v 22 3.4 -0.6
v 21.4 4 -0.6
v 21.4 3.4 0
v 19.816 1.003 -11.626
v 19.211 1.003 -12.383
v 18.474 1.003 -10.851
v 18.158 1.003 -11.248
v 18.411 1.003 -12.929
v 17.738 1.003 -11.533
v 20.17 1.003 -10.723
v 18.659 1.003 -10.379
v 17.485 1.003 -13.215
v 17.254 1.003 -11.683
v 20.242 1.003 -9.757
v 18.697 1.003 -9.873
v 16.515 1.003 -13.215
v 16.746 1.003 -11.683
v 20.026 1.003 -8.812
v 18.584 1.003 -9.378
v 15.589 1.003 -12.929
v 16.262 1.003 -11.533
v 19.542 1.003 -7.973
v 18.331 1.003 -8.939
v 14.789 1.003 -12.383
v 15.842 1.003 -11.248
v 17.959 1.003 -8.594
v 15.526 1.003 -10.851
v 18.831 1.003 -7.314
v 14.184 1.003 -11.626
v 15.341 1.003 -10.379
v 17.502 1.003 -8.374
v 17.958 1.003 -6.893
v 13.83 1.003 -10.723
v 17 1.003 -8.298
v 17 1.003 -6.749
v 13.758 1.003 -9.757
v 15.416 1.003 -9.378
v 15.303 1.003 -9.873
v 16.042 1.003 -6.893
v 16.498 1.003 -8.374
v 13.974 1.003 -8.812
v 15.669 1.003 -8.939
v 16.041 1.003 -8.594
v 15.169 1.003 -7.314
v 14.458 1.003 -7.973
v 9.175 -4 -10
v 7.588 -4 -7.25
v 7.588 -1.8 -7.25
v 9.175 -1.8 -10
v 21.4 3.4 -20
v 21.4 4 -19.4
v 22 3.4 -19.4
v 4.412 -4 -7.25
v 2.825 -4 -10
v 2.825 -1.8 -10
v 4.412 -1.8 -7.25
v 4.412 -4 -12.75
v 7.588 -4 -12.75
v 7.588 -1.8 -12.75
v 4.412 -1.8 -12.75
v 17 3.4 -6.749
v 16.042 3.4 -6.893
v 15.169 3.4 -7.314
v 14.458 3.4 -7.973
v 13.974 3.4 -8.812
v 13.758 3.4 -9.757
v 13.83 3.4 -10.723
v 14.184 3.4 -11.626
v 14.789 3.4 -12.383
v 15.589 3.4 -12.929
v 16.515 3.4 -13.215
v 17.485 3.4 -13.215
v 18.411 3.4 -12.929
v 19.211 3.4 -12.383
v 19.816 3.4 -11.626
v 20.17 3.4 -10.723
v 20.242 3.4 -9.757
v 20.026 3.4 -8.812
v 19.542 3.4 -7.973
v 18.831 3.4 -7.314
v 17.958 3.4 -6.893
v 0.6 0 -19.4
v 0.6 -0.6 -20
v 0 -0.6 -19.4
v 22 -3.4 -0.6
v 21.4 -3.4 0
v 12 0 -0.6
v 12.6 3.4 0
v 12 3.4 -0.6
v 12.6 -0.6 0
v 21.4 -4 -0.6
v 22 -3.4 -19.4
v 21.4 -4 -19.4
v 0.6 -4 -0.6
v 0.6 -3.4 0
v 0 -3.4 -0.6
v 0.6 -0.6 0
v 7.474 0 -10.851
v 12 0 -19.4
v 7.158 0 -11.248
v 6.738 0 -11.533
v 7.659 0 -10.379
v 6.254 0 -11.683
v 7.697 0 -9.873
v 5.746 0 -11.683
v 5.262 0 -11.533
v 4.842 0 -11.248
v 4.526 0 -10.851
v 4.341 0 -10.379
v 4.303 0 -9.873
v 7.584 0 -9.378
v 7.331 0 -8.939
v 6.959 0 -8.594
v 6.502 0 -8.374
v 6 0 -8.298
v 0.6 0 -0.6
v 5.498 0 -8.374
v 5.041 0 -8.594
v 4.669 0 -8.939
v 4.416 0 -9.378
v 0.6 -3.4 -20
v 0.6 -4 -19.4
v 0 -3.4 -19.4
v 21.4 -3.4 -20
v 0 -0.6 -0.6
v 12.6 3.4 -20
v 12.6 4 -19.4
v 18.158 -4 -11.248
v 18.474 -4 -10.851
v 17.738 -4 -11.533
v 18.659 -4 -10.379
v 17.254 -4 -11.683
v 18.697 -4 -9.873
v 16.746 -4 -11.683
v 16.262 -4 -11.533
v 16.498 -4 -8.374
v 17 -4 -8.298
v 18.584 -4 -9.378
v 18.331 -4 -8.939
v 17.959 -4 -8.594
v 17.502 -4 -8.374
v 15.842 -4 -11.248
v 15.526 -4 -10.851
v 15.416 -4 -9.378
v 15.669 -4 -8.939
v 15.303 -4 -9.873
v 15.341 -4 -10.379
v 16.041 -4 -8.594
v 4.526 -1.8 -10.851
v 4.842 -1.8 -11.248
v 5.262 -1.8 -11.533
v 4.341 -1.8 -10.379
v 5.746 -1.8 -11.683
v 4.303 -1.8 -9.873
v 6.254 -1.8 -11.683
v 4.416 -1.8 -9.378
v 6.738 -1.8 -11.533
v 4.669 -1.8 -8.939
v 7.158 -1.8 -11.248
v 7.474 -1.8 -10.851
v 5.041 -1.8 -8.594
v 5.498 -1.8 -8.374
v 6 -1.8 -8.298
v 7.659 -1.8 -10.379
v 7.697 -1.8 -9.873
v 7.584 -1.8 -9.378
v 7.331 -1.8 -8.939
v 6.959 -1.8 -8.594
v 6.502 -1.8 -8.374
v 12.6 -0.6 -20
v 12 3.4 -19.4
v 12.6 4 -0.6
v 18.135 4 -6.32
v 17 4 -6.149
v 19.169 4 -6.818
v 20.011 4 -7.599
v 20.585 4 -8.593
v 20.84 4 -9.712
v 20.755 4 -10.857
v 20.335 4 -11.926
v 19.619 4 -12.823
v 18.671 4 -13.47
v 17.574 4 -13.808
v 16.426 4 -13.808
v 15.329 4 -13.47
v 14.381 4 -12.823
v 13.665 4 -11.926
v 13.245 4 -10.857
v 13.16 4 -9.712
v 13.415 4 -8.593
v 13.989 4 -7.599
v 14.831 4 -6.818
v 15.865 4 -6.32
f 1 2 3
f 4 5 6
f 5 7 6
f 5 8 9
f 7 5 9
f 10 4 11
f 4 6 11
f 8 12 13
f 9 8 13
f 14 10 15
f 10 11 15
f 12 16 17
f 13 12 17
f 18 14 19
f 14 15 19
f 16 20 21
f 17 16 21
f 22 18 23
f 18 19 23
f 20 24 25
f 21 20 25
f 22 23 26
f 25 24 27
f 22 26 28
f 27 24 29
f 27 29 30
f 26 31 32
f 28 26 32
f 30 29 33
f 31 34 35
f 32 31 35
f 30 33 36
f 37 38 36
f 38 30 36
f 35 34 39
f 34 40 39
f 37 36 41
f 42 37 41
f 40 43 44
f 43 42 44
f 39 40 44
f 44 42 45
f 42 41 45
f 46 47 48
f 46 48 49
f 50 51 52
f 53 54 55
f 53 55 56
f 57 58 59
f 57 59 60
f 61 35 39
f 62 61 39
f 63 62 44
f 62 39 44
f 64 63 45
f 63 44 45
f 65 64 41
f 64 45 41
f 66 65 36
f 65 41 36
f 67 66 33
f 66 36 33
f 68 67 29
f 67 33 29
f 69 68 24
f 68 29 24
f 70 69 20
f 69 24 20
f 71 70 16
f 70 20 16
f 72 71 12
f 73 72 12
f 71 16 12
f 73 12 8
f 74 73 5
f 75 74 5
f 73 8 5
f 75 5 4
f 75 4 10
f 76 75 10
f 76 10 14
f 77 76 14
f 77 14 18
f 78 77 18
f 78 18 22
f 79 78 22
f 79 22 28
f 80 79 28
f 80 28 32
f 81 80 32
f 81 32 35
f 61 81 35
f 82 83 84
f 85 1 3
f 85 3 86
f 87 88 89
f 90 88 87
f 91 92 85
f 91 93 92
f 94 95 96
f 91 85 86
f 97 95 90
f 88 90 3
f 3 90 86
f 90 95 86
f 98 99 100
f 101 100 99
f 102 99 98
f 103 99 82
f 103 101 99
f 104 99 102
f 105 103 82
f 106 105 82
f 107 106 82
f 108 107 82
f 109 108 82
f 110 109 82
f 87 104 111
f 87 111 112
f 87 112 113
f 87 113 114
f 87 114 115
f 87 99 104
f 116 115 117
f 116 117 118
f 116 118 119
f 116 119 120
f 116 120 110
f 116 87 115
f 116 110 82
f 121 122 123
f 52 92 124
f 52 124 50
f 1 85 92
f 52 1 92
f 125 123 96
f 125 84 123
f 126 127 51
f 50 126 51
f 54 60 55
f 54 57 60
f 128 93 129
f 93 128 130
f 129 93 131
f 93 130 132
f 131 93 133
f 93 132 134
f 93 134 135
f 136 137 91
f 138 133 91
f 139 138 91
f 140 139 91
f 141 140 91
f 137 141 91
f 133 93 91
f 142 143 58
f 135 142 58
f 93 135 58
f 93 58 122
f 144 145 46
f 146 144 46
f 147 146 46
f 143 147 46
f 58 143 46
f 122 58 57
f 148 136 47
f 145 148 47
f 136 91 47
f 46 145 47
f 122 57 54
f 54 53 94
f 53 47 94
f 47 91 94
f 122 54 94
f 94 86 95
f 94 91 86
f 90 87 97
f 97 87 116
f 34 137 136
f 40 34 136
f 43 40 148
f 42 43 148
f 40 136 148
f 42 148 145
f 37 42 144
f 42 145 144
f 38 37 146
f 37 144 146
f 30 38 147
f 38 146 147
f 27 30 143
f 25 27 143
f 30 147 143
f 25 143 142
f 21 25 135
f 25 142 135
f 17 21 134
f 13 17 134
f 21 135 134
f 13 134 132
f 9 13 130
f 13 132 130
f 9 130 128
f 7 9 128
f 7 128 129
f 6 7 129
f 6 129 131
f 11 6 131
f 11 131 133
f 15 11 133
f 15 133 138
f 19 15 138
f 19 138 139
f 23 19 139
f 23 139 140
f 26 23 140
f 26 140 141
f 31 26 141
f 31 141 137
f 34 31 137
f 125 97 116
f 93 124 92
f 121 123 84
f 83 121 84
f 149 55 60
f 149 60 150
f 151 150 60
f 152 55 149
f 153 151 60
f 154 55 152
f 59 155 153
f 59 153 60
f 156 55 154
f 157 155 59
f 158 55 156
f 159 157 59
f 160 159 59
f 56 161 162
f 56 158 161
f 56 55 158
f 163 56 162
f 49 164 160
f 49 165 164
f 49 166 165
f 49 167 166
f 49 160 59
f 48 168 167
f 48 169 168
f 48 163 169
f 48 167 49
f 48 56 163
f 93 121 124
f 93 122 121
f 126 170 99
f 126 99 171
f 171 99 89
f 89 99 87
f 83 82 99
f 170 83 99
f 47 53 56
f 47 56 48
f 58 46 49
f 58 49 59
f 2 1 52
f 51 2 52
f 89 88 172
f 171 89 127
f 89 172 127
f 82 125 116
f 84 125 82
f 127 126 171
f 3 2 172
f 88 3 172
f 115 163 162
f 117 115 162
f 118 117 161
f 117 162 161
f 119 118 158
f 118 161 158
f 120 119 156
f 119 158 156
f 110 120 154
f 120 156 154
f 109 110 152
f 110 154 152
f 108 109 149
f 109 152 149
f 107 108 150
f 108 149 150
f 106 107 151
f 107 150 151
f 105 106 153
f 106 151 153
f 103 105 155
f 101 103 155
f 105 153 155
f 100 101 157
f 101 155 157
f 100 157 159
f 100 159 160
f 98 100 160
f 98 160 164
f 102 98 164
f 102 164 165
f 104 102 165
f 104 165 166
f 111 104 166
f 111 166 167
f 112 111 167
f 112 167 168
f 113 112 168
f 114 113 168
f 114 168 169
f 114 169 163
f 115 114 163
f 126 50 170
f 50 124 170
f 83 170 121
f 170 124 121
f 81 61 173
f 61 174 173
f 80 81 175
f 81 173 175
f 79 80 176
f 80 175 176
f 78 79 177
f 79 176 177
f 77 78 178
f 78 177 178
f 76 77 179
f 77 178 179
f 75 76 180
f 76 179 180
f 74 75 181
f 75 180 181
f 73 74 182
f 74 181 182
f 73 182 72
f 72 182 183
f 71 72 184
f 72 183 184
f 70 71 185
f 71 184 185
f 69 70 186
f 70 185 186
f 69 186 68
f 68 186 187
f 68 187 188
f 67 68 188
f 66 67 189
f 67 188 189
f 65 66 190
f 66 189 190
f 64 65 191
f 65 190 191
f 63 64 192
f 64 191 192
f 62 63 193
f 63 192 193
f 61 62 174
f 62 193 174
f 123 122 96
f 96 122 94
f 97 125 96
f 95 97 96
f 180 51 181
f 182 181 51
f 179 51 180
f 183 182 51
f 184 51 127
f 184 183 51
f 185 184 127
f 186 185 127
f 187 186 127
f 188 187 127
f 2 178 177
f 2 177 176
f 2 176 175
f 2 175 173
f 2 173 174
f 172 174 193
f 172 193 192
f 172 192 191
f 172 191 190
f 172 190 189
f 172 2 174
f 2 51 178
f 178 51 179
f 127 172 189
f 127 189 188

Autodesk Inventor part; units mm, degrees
ref_plane "YZ Plane" through (0, 0, 0) normal (1, 0, 0) x (0, 1, 0)
ref_plane "XZ Plane" through (0, 0, 0) normal (0, 1, 0) x (-1, 0, 0)
ref_plane "XY Plane" through (0, 0, 0) normal (0, 0, 1) x (1, 0, 0)
sketch "Sketch1" plane through (0, 0, 0) normal (0, 1, 0) x (-1, 0, 0)
  line L0 (0, 0) -> (-22, 0)
  line L1 (-22, 0) -> (-22, -20)
  line L2 (-22, -20) -> (0, -20)
  line L3 (0, -20) -> (0, 0)
  line L4 (-12, -20) -> (-12, 0)
  point P0 (-17, -10)
  point P1 (-22, -10)
  point P2 (-6, -10)
  point P3 (0, -10)
  dimension "d0" = 20
  dimension "d5" = 12
  dimension "d7" = 5
  dimension "d8" = 5
  dimension "d25" = 6
extrude "Extrusion1" add sketch "Sketch1" against normal blind 4
hole "Hole2" at (6, 0, -10) direction (0, -1, 0) diameter 3.4036 end through all clearance for "Socket Head Cap Screw" size "M3" standard "Ansi Metric M Profile"
sketch "Sketch3" plane through (0, -4, 0) normal (0, -1, 0) x (1, 0, 0)
  circle A0 centre (6, -10) radius 1.7018 construction
  line L0 (9.1754, -10) -> (7.5877, -12.75)
  line L1 (7.5877, -12.75) -> (4.4123, -12.75)
  line L2 (4.4123, -12.75) -> (2.8246, -10)
  line L3 (2.8246, -10) -> (4.4123, -7.25)
  line L4 (4.4123, -7.25) -> (7.5877, -7.25)
  line L5 (7.5877, -7.25) -> (9.1754, -10)
  dimension "d33" = 5.5
extrude "Extrusion4" cut sketch "Sketch3" against normal blind 2.2
extrude "Extrusion2" add sketch "Sketch1" along normal blind 4 contours L4 L2 L1 L0
sketch "Sketch2" plane through (0, 4, 0) normal (0, 1, 0) x (1, 0, 0)
  point P0 (17, 10)
hole "Hole1" at (17, 4, -10) direction (0, -1, 0) diameter 3.4036 end through all counterbore diameter 6.5024 counterbore depth 2.9972 clearance for "Socket Head Cap Screw" size "M3" standard "Ansi Metric M Profile"
chamfer "Chamfer1" distance 0.6 angle 45 18 edges at (6, 0, -20) (12, 2, -20) (17, 4, -20) (22, 4, -10) (17, 4, 0) (12, 2, 0) (6, 0, 0) (0, -2, 0) (22, 0, 0) (22, 0, -20) (11, -4, -20) (22, -4, -10) (11, -4, 0) (0, -4, -10) (0, -2, -20) (17, 4, -13.2512) (0, 0, -10) (12, 4, -10)
equation "\"d8\" = d7"
equation "\"d25\" = 0.5 * d5"
